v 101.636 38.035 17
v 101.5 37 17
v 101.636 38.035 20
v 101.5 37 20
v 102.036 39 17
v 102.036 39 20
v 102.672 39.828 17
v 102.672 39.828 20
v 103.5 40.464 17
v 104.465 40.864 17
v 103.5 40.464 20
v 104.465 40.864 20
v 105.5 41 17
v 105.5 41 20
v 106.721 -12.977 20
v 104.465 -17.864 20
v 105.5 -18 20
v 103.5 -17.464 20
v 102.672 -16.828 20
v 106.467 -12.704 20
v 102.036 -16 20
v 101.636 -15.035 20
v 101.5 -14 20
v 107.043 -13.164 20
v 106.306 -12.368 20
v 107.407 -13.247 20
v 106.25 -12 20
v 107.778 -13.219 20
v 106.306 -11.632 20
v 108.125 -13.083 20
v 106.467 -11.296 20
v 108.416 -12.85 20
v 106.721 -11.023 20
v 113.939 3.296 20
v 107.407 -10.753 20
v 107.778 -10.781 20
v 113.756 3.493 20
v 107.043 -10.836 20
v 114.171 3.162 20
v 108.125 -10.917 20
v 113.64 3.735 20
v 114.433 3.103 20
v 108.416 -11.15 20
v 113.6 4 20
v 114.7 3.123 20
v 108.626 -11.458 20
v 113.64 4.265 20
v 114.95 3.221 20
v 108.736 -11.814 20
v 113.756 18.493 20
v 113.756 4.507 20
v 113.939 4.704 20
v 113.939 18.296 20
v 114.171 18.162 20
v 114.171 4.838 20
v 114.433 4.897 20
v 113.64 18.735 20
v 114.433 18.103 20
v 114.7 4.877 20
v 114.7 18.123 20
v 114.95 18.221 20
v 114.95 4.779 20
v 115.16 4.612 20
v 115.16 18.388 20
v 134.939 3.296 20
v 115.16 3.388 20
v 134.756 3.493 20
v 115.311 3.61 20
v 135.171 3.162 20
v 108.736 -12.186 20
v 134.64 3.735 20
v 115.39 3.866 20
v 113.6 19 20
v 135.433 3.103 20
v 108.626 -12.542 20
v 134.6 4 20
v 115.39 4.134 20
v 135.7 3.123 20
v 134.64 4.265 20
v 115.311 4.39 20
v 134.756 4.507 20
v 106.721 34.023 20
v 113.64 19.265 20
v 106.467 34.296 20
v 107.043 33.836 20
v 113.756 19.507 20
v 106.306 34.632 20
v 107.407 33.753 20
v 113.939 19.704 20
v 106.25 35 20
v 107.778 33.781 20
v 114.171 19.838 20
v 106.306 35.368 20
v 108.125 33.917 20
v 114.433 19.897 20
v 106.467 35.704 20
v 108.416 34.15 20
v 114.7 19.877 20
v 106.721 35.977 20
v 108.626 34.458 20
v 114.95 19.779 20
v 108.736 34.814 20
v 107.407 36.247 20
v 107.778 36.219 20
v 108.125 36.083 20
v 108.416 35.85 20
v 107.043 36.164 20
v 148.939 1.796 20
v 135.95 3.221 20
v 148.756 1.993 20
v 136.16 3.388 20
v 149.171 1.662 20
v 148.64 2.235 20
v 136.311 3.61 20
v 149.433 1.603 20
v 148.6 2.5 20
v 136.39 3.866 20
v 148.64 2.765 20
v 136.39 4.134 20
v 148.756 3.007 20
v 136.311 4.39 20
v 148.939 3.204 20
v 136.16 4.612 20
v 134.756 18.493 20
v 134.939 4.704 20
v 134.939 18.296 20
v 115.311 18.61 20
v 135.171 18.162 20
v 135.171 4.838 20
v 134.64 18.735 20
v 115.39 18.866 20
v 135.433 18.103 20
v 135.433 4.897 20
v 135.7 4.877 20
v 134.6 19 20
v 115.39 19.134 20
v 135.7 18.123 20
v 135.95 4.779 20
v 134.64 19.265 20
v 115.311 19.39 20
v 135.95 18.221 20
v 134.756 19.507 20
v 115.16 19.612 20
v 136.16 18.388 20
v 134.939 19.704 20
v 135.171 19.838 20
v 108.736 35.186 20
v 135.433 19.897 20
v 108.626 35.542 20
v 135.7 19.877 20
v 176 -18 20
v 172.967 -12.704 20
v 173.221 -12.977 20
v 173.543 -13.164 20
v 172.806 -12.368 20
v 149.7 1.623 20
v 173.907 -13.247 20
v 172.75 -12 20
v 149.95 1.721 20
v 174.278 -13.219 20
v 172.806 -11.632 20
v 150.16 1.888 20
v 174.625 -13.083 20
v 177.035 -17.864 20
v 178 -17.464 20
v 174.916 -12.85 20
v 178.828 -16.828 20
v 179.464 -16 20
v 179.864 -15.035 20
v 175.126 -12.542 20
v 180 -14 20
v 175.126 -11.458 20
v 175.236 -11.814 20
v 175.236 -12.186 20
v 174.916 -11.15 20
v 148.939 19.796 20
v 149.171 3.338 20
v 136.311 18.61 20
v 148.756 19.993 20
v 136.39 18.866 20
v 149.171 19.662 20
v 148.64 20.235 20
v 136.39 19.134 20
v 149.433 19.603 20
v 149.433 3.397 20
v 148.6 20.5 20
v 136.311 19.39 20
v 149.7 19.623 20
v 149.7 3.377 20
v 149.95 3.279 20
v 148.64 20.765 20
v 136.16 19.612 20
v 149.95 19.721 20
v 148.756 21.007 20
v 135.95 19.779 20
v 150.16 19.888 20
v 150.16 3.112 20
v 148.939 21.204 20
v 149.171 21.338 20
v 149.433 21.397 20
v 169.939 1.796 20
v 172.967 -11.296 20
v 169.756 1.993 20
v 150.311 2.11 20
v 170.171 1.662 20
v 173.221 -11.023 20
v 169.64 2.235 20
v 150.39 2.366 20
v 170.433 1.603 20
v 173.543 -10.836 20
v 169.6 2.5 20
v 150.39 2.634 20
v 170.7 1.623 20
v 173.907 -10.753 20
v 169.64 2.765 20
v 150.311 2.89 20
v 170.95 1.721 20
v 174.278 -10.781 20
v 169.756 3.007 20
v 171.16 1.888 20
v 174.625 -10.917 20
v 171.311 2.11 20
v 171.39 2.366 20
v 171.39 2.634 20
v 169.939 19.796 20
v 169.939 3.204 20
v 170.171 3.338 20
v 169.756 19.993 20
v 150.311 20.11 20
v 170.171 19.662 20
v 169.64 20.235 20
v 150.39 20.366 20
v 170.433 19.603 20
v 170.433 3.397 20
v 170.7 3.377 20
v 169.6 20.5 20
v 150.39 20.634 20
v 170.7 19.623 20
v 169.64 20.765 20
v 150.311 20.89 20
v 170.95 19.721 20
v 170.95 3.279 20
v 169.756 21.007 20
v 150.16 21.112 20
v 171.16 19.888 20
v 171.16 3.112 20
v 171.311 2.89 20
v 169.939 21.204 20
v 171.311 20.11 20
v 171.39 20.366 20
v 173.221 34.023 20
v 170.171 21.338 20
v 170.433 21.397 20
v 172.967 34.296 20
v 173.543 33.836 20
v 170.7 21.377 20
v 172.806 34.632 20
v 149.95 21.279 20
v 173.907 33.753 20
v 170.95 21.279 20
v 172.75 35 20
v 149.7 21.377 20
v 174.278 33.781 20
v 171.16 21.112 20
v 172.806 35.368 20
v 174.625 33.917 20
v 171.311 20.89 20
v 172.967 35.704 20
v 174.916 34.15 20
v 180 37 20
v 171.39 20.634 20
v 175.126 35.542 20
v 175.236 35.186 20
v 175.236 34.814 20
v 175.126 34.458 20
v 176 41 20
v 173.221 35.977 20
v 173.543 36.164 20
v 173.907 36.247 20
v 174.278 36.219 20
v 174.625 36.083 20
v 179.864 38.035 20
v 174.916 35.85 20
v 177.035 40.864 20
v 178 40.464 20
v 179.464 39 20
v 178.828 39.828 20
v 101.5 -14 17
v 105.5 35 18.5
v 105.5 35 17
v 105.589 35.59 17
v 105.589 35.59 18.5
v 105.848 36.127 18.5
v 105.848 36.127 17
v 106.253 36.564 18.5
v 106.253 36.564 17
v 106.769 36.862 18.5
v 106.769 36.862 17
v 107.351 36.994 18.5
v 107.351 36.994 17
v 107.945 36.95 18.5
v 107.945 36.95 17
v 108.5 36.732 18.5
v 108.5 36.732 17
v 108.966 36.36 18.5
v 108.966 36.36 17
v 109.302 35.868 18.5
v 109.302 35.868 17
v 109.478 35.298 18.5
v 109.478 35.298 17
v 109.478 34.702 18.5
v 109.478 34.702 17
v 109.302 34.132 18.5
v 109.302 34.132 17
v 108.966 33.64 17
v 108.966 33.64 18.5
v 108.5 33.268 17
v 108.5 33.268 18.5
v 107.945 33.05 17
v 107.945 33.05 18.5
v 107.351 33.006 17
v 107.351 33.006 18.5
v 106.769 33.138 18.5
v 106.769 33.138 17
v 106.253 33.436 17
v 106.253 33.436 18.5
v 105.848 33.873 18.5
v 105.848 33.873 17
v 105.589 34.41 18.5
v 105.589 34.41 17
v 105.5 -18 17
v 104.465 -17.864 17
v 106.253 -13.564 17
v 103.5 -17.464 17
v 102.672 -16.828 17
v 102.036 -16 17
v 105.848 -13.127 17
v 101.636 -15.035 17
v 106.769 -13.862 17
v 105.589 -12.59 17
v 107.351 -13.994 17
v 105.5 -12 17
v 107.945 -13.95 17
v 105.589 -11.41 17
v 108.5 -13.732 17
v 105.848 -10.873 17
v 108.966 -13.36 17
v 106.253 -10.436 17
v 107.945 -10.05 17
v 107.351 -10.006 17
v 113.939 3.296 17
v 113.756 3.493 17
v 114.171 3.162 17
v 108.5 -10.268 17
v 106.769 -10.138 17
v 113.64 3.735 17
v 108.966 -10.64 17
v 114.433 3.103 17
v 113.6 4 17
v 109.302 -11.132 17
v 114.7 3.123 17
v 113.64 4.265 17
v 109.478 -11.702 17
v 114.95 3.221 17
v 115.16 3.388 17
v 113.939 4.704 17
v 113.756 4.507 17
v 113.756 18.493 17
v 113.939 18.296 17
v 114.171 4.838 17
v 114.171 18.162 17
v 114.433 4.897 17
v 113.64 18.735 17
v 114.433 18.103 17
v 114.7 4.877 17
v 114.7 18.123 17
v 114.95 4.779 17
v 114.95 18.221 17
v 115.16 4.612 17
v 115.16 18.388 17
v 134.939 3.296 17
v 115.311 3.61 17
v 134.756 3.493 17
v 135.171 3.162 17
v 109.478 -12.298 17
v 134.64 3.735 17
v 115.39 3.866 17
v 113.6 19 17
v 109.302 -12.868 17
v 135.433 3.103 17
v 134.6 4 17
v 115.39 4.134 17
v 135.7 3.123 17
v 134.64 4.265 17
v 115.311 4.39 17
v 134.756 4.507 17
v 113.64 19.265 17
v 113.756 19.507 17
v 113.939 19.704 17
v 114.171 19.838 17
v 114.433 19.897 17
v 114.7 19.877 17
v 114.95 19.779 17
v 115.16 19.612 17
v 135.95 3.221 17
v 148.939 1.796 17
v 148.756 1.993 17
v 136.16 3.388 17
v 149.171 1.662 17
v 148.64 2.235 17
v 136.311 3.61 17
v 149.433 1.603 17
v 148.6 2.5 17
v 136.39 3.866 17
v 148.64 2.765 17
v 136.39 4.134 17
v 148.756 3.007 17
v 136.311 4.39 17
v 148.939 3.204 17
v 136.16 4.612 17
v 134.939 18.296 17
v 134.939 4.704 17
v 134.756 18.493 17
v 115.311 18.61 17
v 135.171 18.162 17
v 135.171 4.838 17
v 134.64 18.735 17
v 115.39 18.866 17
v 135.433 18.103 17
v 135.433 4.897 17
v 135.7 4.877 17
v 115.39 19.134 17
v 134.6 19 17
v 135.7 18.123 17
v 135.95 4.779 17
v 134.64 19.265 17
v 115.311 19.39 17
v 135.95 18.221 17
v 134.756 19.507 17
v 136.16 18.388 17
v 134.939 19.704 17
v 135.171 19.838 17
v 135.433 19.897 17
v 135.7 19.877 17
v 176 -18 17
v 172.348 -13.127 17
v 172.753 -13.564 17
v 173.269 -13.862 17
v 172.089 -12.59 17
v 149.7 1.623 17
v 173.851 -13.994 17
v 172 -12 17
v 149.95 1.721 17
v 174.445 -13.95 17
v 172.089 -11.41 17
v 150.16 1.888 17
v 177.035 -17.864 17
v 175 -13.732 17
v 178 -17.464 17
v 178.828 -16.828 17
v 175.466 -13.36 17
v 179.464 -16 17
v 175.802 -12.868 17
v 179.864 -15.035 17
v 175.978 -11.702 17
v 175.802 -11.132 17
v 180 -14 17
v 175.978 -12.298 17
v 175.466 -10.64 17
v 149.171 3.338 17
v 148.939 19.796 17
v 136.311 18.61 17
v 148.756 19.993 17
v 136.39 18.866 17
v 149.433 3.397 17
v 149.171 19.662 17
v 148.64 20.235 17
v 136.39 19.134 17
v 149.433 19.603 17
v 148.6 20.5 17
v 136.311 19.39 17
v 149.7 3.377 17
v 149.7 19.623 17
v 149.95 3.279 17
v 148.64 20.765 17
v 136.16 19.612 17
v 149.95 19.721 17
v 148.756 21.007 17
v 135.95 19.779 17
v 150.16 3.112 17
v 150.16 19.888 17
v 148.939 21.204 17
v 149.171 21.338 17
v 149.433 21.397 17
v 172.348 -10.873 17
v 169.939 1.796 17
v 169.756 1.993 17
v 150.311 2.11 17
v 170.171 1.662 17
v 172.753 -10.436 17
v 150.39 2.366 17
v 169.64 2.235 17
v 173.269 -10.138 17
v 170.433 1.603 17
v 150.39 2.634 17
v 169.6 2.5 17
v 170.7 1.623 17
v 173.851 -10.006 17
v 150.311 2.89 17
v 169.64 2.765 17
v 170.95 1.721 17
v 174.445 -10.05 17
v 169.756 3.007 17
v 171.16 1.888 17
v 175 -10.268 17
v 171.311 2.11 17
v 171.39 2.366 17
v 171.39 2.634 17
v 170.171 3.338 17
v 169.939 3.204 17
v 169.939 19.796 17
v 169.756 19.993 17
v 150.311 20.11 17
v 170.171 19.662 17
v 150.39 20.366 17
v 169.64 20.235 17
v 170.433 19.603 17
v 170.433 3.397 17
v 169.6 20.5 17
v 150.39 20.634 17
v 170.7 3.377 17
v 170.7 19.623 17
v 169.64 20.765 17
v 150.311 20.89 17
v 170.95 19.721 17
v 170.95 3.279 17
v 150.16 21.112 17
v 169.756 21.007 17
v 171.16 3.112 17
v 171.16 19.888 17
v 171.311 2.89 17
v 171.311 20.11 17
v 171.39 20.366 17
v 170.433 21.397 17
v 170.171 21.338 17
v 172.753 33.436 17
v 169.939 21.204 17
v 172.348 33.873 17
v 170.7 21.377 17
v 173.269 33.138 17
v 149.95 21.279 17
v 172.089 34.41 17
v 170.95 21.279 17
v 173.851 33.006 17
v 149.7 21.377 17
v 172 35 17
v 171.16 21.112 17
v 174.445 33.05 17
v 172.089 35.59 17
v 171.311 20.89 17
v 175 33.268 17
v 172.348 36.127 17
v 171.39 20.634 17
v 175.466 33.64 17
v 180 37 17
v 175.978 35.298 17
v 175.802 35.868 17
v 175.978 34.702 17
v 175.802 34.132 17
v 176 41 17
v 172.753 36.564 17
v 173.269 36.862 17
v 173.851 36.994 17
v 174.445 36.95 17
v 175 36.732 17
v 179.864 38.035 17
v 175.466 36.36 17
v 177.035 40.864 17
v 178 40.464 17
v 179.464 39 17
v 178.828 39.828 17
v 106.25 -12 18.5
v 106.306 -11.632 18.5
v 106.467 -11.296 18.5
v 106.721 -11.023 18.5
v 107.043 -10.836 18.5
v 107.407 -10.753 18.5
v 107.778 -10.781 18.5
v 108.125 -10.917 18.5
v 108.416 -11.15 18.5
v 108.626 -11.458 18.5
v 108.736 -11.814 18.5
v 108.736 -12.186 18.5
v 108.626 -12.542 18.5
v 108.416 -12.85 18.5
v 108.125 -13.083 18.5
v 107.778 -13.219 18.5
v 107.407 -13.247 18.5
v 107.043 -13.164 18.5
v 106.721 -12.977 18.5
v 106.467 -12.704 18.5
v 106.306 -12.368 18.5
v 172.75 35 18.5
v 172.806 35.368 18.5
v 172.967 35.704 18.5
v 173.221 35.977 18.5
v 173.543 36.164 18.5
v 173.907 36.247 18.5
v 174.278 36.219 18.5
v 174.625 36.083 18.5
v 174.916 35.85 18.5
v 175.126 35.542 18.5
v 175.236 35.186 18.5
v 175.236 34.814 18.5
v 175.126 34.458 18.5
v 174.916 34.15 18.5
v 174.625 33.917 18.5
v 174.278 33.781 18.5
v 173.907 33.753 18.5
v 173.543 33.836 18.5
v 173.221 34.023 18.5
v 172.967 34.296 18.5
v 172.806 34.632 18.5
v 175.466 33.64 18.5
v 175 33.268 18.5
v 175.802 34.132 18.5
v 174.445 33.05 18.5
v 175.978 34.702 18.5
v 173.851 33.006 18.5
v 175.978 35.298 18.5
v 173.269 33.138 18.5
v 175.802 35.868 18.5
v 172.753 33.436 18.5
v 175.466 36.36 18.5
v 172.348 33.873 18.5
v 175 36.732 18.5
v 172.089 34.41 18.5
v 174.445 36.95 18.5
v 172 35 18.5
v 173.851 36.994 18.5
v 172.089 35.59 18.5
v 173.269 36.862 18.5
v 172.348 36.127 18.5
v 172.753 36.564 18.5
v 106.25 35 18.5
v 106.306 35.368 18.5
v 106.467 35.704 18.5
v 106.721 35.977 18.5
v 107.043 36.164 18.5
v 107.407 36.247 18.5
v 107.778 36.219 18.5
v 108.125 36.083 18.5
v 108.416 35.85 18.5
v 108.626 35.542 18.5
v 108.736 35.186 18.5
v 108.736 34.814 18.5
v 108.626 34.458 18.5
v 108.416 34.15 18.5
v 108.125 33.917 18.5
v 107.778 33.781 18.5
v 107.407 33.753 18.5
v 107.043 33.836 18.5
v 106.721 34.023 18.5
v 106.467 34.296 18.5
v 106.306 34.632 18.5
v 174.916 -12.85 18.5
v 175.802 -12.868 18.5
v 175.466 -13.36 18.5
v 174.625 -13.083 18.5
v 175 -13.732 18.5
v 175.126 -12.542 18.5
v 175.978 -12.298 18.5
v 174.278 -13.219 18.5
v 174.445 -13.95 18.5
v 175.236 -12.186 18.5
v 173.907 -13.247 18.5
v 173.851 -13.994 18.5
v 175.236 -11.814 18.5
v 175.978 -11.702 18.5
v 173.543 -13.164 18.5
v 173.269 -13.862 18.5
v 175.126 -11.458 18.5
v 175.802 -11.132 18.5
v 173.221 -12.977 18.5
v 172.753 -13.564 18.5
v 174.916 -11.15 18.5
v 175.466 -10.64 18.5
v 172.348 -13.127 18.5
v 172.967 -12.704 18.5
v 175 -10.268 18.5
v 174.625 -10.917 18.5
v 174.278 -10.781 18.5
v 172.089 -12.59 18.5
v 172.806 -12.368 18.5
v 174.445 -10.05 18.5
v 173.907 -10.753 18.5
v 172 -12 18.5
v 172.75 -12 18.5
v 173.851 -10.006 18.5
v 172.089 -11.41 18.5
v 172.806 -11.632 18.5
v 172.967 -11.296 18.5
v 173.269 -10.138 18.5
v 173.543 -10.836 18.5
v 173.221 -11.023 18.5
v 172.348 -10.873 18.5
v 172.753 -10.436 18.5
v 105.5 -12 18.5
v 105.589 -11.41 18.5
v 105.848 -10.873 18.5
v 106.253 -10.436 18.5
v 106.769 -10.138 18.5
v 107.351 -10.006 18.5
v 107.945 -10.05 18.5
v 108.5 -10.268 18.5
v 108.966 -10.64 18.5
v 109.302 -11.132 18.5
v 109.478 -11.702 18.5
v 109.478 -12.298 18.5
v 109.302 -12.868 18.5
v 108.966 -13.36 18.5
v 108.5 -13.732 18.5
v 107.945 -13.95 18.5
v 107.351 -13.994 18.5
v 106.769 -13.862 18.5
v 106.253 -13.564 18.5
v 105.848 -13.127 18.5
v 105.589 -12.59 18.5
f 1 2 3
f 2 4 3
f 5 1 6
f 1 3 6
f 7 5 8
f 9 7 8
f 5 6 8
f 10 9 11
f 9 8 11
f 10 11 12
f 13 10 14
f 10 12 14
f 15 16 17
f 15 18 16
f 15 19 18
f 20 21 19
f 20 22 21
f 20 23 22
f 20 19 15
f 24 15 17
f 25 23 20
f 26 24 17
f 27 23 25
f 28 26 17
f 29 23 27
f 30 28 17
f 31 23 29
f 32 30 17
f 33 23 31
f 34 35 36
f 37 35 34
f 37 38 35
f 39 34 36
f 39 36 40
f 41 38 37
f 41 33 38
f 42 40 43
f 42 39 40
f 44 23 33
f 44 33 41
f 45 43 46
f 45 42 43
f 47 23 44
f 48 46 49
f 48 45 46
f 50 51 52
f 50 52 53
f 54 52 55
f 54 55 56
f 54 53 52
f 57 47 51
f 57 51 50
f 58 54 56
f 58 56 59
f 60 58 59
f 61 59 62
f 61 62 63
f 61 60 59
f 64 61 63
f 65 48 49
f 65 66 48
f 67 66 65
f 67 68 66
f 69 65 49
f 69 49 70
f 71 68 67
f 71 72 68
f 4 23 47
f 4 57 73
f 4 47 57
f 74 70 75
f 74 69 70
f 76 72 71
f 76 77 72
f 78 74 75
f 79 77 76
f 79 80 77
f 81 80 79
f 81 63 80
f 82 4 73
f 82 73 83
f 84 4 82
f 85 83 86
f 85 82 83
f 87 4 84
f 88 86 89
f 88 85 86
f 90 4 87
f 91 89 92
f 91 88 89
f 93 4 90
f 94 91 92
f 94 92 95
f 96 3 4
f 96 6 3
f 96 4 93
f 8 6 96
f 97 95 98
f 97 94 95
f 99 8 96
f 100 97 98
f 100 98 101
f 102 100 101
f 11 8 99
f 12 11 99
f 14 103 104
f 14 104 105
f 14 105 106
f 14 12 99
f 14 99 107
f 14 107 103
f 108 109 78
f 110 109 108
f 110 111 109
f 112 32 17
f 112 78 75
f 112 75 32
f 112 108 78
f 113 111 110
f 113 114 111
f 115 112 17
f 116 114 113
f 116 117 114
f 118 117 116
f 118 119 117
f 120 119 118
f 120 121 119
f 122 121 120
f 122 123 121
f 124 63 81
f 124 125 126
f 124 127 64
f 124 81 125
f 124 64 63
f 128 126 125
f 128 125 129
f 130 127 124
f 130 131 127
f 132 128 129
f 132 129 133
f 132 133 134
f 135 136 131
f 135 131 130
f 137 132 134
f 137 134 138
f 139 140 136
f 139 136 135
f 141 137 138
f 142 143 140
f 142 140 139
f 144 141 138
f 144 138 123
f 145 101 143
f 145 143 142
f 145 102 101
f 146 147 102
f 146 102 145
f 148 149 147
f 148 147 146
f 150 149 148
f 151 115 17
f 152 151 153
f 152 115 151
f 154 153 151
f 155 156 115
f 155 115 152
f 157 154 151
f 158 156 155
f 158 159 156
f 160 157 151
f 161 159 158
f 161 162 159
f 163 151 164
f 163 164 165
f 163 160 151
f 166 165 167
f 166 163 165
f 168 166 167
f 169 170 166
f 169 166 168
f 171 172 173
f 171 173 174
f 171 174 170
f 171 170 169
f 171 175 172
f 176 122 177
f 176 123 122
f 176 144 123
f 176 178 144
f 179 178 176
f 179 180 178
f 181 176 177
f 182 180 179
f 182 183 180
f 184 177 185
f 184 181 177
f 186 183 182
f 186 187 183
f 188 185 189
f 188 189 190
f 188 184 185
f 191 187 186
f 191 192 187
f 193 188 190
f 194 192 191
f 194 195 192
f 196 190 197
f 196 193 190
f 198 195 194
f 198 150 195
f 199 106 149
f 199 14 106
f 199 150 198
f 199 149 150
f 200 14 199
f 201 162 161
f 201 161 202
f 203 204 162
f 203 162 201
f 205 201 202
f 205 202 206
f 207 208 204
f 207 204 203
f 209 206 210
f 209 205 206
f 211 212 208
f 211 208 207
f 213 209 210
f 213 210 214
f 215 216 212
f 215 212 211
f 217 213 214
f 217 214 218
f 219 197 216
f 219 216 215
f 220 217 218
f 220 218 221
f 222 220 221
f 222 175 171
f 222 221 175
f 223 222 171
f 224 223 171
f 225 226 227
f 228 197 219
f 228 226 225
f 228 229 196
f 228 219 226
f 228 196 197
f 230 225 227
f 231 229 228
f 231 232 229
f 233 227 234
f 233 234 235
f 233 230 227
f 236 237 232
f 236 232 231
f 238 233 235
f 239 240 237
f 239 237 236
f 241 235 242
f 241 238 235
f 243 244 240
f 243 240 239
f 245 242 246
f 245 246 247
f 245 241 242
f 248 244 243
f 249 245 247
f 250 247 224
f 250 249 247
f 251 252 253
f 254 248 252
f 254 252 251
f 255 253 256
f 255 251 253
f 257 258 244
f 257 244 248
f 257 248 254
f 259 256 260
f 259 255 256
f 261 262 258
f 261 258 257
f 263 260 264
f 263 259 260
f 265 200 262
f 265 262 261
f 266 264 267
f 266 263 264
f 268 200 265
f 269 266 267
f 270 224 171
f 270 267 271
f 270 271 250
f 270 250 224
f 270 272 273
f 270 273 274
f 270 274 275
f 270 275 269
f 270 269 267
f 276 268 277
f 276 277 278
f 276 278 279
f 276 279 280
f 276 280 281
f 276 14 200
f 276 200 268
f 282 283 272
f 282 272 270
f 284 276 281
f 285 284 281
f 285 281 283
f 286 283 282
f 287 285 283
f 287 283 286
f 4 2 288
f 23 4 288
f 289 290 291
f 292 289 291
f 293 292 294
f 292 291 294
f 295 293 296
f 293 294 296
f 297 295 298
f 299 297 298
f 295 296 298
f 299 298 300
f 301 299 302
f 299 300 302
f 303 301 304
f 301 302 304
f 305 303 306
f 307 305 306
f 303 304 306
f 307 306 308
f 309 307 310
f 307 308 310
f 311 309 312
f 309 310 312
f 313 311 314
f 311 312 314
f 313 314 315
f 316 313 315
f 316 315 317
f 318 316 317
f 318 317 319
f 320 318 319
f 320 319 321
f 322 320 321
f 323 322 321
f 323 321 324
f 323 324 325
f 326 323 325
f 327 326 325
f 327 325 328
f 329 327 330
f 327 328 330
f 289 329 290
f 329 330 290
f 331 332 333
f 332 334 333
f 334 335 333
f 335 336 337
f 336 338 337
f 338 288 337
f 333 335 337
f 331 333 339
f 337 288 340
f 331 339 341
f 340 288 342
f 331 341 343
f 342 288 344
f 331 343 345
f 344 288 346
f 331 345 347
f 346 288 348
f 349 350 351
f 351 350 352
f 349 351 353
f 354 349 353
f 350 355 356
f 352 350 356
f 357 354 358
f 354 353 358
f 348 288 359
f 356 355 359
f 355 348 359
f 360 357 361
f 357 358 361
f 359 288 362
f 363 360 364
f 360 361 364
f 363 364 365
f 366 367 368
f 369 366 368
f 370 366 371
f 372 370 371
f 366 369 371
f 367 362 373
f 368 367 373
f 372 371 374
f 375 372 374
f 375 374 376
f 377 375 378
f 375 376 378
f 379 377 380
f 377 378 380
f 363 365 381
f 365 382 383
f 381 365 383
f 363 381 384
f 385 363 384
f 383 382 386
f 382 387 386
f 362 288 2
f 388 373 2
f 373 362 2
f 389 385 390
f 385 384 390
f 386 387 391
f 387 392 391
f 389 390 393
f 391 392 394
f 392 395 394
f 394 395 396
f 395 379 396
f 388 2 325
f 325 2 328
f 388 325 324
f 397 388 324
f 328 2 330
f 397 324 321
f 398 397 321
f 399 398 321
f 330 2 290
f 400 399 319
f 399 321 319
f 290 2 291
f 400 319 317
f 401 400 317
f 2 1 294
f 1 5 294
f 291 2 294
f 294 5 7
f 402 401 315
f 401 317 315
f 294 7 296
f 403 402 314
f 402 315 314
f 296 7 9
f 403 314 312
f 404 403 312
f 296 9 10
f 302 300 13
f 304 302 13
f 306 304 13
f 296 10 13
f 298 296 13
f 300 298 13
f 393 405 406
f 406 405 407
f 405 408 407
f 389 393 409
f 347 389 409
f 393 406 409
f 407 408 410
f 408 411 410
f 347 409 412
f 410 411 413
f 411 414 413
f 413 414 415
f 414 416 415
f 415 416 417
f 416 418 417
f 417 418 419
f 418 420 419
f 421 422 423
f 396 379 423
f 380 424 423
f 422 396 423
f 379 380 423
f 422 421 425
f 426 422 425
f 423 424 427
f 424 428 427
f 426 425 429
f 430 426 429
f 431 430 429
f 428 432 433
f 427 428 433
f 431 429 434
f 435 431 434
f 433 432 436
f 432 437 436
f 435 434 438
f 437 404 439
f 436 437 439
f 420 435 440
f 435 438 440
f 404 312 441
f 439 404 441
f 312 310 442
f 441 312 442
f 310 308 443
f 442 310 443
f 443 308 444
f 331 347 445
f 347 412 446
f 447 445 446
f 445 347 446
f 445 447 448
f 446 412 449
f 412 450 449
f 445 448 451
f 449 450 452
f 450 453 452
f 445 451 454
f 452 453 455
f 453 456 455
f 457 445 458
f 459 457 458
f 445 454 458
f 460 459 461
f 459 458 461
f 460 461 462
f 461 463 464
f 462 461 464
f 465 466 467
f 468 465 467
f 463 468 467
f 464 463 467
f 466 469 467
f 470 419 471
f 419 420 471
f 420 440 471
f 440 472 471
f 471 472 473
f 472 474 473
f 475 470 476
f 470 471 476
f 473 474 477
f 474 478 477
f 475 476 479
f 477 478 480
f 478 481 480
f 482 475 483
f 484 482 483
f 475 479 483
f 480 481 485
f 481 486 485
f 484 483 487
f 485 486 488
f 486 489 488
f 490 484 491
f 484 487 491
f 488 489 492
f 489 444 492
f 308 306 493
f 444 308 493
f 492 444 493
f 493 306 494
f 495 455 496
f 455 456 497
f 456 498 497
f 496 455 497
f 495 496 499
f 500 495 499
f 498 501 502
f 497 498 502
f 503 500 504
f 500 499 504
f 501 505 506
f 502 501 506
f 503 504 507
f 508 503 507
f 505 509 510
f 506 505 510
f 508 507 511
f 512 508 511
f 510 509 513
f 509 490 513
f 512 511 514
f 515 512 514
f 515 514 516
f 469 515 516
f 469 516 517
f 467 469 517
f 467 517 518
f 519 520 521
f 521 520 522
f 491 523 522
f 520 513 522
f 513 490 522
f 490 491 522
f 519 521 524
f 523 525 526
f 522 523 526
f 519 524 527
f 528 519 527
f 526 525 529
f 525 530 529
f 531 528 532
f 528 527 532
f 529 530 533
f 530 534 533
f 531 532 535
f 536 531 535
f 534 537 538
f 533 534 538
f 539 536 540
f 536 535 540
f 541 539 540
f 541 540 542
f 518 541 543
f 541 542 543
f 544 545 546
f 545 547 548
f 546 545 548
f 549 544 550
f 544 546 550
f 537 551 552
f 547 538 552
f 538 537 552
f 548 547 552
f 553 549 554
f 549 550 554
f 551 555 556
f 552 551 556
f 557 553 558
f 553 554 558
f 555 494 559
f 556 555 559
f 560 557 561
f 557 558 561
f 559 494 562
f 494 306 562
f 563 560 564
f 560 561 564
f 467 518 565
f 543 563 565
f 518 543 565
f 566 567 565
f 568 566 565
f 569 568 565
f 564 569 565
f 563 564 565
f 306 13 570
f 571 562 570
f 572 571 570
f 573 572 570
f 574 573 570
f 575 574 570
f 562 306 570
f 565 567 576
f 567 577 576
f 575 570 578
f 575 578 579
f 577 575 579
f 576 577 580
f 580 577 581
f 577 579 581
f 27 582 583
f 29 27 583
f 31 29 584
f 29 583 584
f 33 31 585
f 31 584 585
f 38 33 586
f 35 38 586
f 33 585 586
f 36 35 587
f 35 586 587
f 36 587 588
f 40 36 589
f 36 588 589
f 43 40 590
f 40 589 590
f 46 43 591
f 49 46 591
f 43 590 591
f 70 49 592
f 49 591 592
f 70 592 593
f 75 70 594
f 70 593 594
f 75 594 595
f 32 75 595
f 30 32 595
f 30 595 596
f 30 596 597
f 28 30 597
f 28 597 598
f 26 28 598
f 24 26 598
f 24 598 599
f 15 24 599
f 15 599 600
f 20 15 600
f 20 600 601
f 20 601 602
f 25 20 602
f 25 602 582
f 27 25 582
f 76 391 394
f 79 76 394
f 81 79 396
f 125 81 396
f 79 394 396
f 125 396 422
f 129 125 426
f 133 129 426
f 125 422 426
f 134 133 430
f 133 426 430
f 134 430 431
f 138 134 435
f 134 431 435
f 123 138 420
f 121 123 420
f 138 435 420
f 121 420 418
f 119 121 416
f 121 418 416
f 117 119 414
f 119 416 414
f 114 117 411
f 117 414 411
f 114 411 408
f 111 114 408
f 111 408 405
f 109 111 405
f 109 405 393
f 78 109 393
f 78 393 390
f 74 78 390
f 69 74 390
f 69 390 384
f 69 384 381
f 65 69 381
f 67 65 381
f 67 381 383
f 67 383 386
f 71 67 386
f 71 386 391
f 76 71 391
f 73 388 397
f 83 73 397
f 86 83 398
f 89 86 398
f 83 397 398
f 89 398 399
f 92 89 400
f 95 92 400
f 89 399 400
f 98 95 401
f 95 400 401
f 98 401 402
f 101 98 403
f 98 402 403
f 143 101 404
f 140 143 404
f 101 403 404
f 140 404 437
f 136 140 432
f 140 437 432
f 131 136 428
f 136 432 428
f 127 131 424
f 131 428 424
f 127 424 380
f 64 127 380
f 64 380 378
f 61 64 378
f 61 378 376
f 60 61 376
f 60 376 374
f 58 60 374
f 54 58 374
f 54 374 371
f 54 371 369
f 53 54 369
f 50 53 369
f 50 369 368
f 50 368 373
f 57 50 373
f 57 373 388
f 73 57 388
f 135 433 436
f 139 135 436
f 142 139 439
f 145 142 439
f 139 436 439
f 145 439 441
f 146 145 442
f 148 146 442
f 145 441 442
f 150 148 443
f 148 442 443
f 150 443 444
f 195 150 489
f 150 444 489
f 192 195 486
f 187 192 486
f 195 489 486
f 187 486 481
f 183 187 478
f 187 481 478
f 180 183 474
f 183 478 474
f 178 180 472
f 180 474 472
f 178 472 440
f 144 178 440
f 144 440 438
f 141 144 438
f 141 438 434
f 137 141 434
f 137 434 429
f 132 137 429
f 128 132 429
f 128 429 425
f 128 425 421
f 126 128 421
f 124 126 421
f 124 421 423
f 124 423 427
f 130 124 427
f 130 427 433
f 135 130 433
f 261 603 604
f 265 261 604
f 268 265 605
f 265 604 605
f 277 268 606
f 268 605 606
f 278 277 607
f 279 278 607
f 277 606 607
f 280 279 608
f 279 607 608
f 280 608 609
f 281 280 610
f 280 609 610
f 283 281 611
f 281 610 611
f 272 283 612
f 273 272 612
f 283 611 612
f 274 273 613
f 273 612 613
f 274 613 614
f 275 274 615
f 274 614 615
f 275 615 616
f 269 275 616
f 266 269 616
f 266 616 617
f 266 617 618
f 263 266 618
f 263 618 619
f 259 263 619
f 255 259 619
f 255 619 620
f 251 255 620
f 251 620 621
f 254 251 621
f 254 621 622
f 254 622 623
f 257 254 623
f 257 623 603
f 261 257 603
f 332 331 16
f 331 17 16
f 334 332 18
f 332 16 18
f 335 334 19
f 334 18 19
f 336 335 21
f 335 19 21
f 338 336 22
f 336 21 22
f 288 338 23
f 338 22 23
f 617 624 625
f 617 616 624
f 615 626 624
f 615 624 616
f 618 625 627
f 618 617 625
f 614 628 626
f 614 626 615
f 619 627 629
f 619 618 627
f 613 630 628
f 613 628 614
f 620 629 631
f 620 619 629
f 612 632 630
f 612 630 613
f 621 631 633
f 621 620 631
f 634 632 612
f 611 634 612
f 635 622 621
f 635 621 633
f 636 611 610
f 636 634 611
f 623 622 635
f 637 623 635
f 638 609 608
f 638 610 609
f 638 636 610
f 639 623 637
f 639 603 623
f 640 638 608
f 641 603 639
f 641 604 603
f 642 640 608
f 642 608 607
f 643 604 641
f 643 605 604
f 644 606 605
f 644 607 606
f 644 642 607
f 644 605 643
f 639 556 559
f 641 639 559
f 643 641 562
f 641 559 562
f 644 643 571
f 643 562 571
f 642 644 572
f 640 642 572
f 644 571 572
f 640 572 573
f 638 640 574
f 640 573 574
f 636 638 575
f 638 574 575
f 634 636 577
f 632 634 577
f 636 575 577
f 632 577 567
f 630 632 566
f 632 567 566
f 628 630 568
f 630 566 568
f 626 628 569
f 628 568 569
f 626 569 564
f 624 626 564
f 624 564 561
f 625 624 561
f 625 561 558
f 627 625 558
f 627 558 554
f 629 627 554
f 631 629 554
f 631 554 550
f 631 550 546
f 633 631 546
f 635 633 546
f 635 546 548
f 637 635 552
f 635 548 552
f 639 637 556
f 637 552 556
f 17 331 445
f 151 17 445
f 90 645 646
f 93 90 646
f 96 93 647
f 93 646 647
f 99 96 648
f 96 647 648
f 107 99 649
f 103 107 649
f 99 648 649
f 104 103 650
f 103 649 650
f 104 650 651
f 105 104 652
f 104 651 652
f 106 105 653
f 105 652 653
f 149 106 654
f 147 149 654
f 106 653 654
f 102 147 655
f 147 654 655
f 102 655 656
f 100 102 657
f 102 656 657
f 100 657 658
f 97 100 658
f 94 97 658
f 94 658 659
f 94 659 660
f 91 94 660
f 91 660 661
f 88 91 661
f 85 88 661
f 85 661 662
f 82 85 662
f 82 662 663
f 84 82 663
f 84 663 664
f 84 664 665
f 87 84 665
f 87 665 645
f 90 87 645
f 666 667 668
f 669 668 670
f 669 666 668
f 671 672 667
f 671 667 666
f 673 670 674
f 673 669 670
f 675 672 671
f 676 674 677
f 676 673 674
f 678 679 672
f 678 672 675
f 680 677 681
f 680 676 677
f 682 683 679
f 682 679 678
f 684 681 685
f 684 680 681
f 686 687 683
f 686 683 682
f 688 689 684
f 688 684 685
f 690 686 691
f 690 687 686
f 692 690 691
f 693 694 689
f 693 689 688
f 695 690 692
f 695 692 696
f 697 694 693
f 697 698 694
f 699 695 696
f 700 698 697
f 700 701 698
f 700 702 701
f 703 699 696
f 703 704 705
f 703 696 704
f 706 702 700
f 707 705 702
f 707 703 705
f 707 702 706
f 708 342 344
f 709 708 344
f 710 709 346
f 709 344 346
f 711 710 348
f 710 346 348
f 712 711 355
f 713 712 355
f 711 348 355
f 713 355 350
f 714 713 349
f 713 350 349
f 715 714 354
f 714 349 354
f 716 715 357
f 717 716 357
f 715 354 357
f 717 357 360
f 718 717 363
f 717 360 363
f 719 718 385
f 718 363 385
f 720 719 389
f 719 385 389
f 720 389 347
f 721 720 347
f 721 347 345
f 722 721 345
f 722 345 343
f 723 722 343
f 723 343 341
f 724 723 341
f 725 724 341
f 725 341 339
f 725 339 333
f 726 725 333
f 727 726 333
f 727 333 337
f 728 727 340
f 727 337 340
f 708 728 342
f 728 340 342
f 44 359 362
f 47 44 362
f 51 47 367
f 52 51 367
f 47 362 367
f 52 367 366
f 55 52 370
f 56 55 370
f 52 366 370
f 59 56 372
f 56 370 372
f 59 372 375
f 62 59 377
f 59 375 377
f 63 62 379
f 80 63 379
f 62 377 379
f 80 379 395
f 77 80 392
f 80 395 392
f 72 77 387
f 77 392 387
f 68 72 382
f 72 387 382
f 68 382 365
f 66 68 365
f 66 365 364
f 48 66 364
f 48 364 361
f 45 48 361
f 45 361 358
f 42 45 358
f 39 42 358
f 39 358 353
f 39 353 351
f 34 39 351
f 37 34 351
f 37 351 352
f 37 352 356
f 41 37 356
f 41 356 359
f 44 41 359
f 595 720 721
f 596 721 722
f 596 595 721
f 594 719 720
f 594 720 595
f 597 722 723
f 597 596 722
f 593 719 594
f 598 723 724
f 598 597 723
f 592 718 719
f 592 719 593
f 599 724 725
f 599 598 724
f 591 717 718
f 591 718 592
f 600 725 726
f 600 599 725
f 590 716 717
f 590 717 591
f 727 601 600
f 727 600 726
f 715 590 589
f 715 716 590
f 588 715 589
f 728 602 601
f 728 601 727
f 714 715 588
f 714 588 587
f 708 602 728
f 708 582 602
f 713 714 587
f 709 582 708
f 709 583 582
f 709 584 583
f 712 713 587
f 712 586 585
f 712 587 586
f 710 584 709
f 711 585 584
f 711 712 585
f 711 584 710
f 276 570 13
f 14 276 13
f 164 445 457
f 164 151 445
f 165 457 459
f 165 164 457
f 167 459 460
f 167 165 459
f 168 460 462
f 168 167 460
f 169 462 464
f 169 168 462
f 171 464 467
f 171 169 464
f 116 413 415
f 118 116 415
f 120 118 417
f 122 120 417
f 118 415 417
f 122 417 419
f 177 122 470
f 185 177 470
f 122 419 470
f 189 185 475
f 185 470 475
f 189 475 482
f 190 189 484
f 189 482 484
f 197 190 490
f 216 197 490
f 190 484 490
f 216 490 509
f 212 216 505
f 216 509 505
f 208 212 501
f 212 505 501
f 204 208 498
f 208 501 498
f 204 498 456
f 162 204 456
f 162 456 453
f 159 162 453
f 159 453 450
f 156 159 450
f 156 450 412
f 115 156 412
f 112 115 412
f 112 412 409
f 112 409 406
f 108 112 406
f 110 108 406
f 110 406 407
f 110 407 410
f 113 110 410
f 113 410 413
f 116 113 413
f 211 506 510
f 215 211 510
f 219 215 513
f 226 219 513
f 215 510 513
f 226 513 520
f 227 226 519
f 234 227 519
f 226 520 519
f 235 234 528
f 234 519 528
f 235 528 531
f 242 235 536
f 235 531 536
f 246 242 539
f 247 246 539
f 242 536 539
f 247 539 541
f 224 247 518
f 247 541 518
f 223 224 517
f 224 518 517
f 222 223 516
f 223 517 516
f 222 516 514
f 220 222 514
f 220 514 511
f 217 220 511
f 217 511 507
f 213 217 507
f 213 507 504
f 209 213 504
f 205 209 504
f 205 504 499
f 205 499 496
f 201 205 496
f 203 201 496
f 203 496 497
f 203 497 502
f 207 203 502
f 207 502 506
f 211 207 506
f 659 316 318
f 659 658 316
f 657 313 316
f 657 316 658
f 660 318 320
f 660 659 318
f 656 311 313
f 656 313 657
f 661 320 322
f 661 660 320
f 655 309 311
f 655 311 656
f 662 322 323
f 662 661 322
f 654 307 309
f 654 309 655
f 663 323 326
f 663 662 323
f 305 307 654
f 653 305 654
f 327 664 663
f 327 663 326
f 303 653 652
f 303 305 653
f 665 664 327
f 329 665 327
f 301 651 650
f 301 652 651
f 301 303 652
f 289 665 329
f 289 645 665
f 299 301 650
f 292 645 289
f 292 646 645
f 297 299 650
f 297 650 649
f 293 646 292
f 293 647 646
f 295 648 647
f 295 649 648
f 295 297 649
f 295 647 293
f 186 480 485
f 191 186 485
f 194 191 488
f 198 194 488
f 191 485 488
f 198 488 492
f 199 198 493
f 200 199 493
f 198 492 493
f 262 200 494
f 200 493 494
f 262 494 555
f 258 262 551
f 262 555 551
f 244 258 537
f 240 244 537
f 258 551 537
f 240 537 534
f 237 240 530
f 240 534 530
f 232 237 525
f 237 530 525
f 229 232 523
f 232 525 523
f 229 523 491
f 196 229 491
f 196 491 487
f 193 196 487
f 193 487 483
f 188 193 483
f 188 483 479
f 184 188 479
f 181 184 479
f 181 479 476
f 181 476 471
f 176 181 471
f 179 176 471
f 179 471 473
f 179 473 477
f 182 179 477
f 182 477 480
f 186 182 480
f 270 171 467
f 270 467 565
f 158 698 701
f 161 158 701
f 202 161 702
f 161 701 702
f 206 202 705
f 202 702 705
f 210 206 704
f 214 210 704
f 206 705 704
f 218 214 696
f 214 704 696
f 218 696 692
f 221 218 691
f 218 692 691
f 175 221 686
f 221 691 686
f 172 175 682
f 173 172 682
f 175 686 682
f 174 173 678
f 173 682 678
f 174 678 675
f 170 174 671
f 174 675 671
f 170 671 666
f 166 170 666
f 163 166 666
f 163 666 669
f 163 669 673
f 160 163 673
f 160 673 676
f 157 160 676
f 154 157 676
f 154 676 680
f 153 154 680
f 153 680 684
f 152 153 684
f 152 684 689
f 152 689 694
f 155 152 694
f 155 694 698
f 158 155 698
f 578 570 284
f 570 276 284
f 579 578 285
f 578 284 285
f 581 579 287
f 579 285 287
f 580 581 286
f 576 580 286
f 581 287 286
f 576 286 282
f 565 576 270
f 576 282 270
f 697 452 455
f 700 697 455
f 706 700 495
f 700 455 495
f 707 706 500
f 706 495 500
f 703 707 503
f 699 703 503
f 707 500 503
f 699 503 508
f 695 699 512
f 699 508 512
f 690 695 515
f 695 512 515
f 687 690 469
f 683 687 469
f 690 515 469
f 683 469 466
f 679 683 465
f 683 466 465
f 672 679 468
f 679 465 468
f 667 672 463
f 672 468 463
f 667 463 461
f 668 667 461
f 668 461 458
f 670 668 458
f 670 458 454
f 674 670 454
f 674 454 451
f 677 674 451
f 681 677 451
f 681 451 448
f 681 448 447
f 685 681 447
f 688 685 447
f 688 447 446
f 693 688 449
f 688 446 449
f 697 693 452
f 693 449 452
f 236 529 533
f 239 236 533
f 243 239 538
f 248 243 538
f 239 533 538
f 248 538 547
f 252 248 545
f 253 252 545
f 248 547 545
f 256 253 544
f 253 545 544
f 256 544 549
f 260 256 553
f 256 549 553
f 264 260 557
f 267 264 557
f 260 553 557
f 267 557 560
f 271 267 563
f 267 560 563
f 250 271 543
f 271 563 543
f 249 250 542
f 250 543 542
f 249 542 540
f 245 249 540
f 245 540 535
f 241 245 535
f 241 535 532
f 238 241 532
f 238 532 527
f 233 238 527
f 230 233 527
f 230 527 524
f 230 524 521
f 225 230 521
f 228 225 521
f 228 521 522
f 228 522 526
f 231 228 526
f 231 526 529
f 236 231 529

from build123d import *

# Parameters (mm, degrees)
SKETCH_2_W          = 170
SKETCH_2_H          = 20
EXTRUDE_1_DEPTH     = 23
CUT_EXTRUDE_1_DEPTH = 173.710740836
SKETCH_4_W          = 17
SKETCH_4_H          = 13
CUT_EXTRUDE_2_DEPTH = 30
CUT_EXTRUDE_3_DEPTH = 173.710740836
SKETCH_6_W          = 87.5
SKETCH_6_H          = 63
EXTRUDE_2_DEPTH     = 3
SKETCH_7_R          = 1.25
CUT_EXTRUDE_4_DEPTH = 186.632028486
SKETCH_7_3_R        = 2
CUT_EXTRUDE_5_DEPTH = 1.5
CUT_EXTRUDE_6_DEPTH = 186.632028486
FILLET_2_R          = 4
SKETCH_10_R         = 0.9
CUT_EXTRUDE_7_DEPTH = 186.178967488
SKETCH_9_W          = 78.5
SKETCH_9_H          = 16.208535094
CUT_EXTRUDE_8_DEPTH = 191.475720238


with BuildPart() as part:
    # 草图2 → 凸台-拉伸1 (new body)
    with BuildSketch(Plane(origin=(0, 0, 0), x_dir=(1, 0, 0), z_dir=(0, 1, 0))):
        with Locations((85, -10)):
            Rectangle(SKETCH_2_W, SKETCH_2_H)
    extrude(amount=EXTRUDE_1_DEPTH)

    # 草图3 → 切除-拉伸1 (cut, through all)
    with BuildSketch(Plane(origin=(0, 23, 0), x_dir=(1, 0, 0), z_dir=(0, 1, 0))):
        with BuildLine():
            ThreePointArc((161.6, -10), (159.341699476, -8.541699476), (158.941699476, -11.2))
            Line((158.941699476, -11.2), (161.058300524, -11.2))
            ThreePointArc((161.058300524, -11.2), (161.458300524, -10.658300524), (161.6, -10))
        make_face()
        with BuildLine():
            ThreePointArc((126.6, -10), (124.341699476, -8.541699476), (123.941699476, -11.2))
            Line((123.941699476, -11.2), (126.058300524, -11.2))
            ThreePointArc((126.058300524, -11.2), (126.458300524, -10.658300524), (126.6, -10))
        make_face()
    extrude(amount=-CUT_EXTRUDE_1_DEPTH, mode=Mode.SUBTRACT)

    # 草图4 → 切除-拉伸2 (cut)
    with BuildSketch(Plane(origin=(170, 0, 0), x_dir=(0, 0, -1), z_dir=(1, 0, 0))):
        with Locations((-8.5, 11.5)):
            Rectangle(SKETCH_4_W, SKETCH_4_H)
    extrude(amount=-CUT_EXTRUDE_2_DEPTH, mode=Mode.SUBTRACT)

    # 草图5 → 切除-拉伸3 (cut, through all)
    with BuildSketch(Plane(origin=(0, 23, 0), x_dir=(1, 0, 0), z_dir=(0, 1, 0))):
        with BuildLine():
            Line((117.5, -17), (117.5, -10))
            ThreePointArc((117.5, -10), (125, -2.5), (132.5, -10))
            Line((132.5, -10), (132.5, -17))
            Line((132.5, -17), (152.5, -17))
            Line((152.5, -17), (152.5, -10))
            ThreePointArc((152.5, -10), (160, -2.5), (167.5, -10))
            Line((167.5, -10), (167.5, -17))
            Line((167.5, -17), (170, -17))
            Line((170, -17), (170, 0))
            Line((170, 0), (0, 0))
            Line((0, 0), (0, -20))
            Line((0, -20), (102.5, -20))
            Line((102.5, -20), (102.5, -17))
            Line((102.5, -17), (117.5, -17))
        make_face()
    extrude(amount=-CUT_EXTRUDE_3_DEPTH, mode=Mode.SUBTRACT)

    # 草图6 → 凸台-拉伸2 (add)
    with BuildSketch(Plane.XY.offset(20)):
        with Locations((136.25, 11.5)):
            Rectangle(SKETCH_6_W, SKETCH_6_H)
    extrude(amount=-EXTRUDE_2_DEPTH)

    # 草图7 → 切除-拉伸4 (cut, through all)
    with BuildSketch(Plane(origin=(0, 0, 17), x_dir=(-1, 0, 0), z_dir=(0, 0, -1))):
        with Locations((-174, 35)):
            Circle(SKETCH_7_R)
        with Locations((-107.5, 35)):
            Circle(SKETCH_7_R)
        with Locations((-107.5, -12)):
            Circle(SKETCH_7_R)
        with Locations((-174, -12)):
            Circle(SKETCH_7_R)
    extrude(amount=-CUT_EXTRUDE_4_DEPTH, mode=Mode.SUBTRACT)

    # 草图7<3> → 切除-拉伸5 (cut)
    with BuildSketch(Plane(origin=(0, 0, 17), x_dir=(-1, 0, 0), z_dir=(0, 0, -1))):
        with Locations((-174, 35)):
            Circle(SKETCH_7_3_R)
        with Locations((-107.5, 35)):
            Circle(SKETCH_7_3_R)
        with Locations((-174, -12)):
            Circle(SKETCH_7_3_R)
        with Locations((-107.5, -12)):
            Circle(SKETCH_7_3_R)
    extrude(amount=-CUT_EXTRUDE_5_DEPTH, mode=Mode.SUBTRACT)

    # 草图8 → 切除-拉伸6 (cut, through all)
    with BuildSketch(Plane(origin=(0, 0, 17), x_dir=(-1, 0, 0), z_dir=(0, 0, -1))):
        Polygon((-180, 43), (-180, 41), (-101.5, 41), (-101.5, -18), (-180, -18), (-180, -20), (-92.5, -20), (-92.5, 43), align=None)
    extrude(amount=-CUT_EXTRUDE_6_DEPTH, mode=Mode.SUBTRACT)

    # 圆角2
    fillet_2_edges = [part.edges().sort_by_distance(p)[0] for p in [
        (101.5, -18, 18.5),
        (101.5, 41, 18.5),
        (180, 41, 18.5),
        (180, -18, 18.5),
    ]]
    fillet(fillet_2_edges, radius=FILLET_2_R)

    # 草图10 → 切除-拉伸7 (cut, through all)
    with BuildSketch(Plane(origin=(0, 0, 17), x_dir=(-1, 0, 0), z_dir=(0, 0, -1))):
        with Locations((-170.5, 20.5)):
            Circle(SKETCH_10_R)
        with Locations((-149.5, 20.5)):
            Circle(SKETCH_10_R)
        with Locations((-170.5, 2.5)):
            Circle(SKETCH_10_R)
        with Locations((-149.5, 2.5)):
            Circle(SKETCH_10_R)
        with Locations((-135.5, 4)):
            Circle(SKETCH_10_R)
        with Locations((-135.5, 19)):
            Circle(SKETCH_10_R)
        with Locations((-114.5, 19)):
            Circle(SKETCH_10_R)
        with Locations((-114.5, 4)):
            Circle(SKETCH_10_R)
    extrude(amount=-CUT_EXTRUDE_7_DEPTH, mode=Mode.SUBTRACT)

    # 草图9 → 切除-拉伸8 (cut, through all)
    with BuildSketch(Plane.XZ.offset(18)):
        with Locations((140.75, 8.895732453)):
            Rectangle(SKETCH_9_W, SKETCH_9_H)
    extrude(amount=-CUT_EXTRUDE_8_DEPTH, mode=Mode.SUBTRACT)


solid = part.part
